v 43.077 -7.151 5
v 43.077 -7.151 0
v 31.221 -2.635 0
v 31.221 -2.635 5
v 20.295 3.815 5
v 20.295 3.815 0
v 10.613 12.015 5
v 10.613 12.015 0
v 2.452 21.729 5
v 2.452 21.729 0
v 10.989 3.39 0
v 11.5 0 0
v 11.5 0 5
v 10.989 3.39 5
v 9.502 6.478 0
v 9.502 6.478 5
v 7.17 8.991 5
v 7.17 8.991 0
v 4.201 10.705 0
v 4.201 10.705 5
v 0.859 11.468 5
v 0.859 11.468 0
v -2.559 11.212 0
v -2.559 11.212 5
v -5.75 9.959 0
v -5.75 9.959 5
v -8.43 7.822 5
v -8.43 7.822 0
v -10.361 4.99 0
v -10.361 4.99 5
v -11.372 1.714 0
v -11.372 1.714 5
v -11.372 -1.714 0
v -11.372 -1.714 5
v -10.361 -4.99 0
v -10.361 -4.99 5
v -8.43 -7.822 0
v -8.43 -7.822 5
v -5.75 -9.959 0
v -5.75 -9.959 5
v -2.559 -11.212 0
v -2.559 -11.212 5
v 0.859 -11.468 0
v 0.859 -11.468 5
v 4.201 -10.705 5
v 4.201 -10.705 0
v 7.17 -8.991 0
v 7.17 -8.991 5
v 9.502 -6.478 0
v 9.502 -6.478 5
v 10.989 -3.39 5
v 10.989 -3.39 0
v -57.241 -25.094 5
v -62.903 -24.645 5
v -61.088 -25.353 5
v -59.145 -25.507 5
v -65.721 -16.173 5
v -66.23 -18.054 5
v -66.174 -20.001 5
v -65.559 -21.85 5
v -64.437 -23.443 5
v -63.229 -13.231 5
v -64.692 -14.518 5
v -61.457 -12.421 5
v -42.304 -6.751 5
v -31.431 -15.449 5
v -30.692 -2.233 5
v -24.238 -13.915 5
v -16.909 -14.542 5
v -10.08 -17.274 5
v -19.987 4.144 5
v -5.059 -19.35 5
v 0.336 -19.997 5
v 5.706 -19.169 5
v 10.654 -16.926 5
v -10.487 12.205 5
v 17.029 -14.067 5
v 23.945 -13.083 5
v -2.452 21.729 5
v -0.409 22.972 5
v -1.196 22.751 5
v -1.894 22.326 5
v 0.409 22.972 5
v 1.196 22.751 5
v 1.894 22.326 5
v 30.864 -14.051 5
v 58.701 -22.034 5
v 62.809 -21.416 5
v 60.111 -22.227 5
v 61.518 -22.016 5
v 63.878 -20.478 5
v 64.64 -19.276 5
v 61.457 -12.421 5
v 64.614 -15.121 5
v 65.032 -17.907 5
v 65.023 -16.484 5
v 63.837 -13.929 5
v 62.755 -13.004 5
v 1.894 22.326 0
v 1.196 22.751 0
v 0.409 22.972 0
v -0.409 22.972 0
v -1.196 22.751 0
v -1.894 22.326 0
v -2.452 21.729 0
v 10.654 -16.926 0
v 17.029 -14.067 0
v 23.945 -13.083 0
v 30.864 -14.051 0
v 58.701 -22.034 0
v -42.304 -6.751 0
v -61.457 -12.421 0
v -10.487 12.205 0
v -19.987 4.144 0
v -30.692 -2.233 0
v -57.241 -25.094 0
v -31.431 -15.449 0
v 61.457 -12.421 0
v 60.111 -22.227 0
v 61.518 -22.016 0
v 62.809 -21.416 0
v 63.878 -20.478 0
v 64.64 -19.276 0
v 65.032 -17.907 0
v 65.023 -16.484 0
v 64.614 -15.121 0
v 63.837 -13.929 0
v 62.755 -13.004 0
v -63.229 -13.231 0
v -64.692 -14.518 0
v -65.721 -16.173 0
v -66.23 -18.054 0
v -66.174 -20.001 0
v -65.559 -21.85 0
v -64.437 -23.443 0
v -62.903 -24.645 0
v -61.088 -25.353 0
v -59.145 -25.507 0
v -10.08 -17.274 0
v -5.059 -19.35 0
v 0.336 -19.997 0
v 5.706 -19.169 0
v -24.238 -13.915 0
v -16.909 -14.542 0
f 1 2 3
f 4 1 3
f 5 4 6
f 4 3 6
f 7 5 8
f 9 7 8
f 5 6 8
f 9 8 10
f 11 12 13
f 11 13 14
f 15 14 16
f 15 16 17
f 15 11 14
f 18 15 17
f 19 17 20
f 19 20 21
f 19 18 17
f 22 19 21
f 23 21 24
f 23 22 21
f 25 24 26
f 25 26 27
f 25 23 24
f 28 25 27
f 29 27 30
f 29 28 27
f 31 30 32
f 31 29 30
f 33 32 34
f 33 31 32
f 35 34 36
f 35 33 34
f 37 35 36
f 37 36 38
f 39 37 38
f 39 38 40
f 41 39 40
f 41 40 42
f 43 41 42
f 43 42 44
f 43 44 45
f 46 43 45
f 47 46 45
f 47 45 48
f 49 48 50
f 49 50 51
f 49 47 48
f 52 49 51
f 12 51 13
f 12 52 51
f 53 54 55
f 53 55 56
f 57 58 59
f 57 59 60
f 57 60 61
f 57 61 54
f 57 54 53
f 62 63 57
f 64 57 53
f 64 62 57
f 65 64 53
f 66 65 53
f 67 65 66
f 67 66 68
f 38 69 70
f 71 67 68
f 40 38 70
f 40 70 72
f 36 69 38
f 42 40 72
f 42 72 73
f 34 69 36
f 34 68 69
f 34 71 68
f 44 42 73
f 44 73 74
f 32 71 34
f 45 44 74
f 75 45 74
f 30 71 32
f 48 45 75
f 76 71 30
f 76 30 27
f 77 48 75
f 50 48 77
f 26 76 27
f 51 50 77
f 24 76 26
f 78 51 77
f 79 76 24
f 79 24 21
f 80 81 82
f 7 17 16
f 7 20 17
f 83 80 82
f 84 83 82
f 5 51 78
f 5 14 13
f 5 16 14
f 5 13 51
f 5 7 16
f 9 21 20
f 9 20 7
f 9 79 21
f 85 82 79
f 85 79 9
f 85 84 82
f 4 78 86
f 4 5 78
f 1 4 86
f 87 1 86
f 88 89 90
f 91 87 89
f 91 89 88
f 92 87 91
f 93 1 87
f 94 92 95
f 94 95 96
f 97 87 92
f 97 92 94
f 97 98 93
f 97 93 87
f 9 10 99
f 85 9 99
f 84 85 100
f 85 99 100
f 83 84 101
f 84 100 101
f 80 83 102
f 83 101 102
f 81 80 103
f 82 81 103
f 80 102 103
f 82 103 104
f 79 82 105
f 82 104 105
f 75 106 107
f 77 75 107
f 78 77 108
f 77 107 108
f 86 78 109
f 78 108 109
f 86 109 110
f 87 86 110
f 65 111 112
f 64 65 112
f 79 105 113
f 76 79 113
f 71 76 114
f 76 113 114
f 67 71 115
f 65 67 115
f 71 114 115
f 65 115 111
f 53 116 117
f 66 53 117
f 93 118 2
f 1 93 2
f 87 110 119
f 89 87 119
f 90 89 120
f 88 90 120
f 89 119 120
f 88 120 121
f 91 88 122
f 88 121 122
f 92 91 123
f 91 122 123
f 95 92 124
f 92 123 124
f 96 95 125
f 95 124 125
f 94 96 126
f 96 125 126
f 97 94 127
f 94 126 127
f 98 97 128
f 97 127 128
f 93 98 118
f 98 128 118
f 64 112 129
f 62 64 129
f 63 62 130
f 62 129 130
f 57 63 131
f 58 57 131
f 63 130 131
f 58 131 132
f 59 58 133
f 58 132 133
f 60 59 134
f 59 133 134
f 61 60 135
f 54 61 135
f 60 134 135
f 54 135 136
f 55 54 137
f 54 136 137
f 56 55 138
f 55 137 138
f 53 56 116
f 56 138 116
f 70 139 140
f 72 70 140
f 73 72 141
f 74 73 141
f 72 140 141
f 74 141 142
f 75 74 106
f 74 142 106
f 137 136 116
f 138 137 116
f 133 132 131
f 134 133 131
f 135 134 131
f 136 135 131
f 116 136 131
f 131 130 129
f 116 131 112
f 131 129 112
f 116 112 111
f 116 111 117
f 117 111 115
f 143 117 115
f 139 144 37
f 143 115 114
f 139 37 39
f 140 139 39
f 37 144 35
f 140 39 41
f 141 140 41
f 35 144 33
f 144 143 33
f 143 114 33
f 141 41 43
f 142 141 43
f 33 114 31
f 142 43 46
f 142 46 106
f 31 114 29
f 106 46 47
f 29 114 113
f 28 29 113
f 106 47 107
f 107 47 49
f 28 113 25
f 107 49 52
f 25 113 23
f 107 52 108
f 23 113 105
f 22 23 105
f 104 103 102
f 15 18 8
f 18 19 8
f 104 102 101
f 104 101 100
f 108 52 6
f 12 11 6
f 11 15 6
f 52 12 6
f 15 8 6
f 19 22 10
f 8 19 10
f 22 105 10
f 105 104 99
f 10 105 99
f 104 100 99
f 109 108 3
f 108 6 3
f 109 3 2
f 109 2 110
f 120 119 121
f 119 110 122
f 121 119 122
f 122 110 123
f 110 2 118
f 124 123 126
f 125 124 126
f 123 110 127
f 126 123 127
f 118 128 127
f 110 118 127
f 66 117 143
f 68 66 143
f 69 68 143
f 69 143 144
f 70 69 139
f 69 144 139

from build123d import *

# Parameters (mm, degrees)
SKETCH1_R           = 11.5
BOSS_EXTRUDE1_DEPTH = 5


with BuildPart() as part:
    # Sketch1 → Boss-Extrude1 (new body)
    with BuildSketch(Plane.XY):
        with BuildLine():
            Line((30.863510665, -14.051466451), (58.700669217, -22.033643218))
            ThreePointArc((58.700669217, -22.033643218), (64.885164476, -18.605521518), (61.457042775, -12.421026259))
            Line((61.457042775, -12.421026259), (43.077002388, -7.150634488))
            ThreePointArc((43.077002388, -7.150634488), (20.295215387, 3.815450095), (2.451915541, 21.728615104))
            ThreePointArc((2.451915541, 21.728615104), (0, 23), (-2.451915541, 21.728615104))
            ThreePointArc((-2.451915541, 21.728615104), (-19.987359953, 4.143898292), (-42.303764549, -6.750694953))
            Line((-42.303764549, -6.750694953), (-61.457042775, -12.421026259))
            ThreePointArc((-61.457042775, -12.421026259), (-65.934476702, -20.948431695), (-57.240992184, -25.094198809))
            Line((-57.240992184, -25.094198809), (-31.431292557, -15.44876451))
            ThreePointArc((-31.431292557, -15.44876451), (-20.55006109, -13.957749538), (-10.079833017, -17.274170497))
            ThreePointArc((-10.079833017, -17.274170497), (0.33600307, -19.997177349), (10.654478564, -16.925781711))
            ThreePointArc((10.654478564, -16.925781711), (20.452273896, -13.332100428), (30.863510665, -14.051466451))
        make_face()
        Circle(SKETCH1_R, mode=Mode.SUBTRACT)
    extrude(amount=BOSS_EXTRUDE1_DEPTH)


solid = part.part
